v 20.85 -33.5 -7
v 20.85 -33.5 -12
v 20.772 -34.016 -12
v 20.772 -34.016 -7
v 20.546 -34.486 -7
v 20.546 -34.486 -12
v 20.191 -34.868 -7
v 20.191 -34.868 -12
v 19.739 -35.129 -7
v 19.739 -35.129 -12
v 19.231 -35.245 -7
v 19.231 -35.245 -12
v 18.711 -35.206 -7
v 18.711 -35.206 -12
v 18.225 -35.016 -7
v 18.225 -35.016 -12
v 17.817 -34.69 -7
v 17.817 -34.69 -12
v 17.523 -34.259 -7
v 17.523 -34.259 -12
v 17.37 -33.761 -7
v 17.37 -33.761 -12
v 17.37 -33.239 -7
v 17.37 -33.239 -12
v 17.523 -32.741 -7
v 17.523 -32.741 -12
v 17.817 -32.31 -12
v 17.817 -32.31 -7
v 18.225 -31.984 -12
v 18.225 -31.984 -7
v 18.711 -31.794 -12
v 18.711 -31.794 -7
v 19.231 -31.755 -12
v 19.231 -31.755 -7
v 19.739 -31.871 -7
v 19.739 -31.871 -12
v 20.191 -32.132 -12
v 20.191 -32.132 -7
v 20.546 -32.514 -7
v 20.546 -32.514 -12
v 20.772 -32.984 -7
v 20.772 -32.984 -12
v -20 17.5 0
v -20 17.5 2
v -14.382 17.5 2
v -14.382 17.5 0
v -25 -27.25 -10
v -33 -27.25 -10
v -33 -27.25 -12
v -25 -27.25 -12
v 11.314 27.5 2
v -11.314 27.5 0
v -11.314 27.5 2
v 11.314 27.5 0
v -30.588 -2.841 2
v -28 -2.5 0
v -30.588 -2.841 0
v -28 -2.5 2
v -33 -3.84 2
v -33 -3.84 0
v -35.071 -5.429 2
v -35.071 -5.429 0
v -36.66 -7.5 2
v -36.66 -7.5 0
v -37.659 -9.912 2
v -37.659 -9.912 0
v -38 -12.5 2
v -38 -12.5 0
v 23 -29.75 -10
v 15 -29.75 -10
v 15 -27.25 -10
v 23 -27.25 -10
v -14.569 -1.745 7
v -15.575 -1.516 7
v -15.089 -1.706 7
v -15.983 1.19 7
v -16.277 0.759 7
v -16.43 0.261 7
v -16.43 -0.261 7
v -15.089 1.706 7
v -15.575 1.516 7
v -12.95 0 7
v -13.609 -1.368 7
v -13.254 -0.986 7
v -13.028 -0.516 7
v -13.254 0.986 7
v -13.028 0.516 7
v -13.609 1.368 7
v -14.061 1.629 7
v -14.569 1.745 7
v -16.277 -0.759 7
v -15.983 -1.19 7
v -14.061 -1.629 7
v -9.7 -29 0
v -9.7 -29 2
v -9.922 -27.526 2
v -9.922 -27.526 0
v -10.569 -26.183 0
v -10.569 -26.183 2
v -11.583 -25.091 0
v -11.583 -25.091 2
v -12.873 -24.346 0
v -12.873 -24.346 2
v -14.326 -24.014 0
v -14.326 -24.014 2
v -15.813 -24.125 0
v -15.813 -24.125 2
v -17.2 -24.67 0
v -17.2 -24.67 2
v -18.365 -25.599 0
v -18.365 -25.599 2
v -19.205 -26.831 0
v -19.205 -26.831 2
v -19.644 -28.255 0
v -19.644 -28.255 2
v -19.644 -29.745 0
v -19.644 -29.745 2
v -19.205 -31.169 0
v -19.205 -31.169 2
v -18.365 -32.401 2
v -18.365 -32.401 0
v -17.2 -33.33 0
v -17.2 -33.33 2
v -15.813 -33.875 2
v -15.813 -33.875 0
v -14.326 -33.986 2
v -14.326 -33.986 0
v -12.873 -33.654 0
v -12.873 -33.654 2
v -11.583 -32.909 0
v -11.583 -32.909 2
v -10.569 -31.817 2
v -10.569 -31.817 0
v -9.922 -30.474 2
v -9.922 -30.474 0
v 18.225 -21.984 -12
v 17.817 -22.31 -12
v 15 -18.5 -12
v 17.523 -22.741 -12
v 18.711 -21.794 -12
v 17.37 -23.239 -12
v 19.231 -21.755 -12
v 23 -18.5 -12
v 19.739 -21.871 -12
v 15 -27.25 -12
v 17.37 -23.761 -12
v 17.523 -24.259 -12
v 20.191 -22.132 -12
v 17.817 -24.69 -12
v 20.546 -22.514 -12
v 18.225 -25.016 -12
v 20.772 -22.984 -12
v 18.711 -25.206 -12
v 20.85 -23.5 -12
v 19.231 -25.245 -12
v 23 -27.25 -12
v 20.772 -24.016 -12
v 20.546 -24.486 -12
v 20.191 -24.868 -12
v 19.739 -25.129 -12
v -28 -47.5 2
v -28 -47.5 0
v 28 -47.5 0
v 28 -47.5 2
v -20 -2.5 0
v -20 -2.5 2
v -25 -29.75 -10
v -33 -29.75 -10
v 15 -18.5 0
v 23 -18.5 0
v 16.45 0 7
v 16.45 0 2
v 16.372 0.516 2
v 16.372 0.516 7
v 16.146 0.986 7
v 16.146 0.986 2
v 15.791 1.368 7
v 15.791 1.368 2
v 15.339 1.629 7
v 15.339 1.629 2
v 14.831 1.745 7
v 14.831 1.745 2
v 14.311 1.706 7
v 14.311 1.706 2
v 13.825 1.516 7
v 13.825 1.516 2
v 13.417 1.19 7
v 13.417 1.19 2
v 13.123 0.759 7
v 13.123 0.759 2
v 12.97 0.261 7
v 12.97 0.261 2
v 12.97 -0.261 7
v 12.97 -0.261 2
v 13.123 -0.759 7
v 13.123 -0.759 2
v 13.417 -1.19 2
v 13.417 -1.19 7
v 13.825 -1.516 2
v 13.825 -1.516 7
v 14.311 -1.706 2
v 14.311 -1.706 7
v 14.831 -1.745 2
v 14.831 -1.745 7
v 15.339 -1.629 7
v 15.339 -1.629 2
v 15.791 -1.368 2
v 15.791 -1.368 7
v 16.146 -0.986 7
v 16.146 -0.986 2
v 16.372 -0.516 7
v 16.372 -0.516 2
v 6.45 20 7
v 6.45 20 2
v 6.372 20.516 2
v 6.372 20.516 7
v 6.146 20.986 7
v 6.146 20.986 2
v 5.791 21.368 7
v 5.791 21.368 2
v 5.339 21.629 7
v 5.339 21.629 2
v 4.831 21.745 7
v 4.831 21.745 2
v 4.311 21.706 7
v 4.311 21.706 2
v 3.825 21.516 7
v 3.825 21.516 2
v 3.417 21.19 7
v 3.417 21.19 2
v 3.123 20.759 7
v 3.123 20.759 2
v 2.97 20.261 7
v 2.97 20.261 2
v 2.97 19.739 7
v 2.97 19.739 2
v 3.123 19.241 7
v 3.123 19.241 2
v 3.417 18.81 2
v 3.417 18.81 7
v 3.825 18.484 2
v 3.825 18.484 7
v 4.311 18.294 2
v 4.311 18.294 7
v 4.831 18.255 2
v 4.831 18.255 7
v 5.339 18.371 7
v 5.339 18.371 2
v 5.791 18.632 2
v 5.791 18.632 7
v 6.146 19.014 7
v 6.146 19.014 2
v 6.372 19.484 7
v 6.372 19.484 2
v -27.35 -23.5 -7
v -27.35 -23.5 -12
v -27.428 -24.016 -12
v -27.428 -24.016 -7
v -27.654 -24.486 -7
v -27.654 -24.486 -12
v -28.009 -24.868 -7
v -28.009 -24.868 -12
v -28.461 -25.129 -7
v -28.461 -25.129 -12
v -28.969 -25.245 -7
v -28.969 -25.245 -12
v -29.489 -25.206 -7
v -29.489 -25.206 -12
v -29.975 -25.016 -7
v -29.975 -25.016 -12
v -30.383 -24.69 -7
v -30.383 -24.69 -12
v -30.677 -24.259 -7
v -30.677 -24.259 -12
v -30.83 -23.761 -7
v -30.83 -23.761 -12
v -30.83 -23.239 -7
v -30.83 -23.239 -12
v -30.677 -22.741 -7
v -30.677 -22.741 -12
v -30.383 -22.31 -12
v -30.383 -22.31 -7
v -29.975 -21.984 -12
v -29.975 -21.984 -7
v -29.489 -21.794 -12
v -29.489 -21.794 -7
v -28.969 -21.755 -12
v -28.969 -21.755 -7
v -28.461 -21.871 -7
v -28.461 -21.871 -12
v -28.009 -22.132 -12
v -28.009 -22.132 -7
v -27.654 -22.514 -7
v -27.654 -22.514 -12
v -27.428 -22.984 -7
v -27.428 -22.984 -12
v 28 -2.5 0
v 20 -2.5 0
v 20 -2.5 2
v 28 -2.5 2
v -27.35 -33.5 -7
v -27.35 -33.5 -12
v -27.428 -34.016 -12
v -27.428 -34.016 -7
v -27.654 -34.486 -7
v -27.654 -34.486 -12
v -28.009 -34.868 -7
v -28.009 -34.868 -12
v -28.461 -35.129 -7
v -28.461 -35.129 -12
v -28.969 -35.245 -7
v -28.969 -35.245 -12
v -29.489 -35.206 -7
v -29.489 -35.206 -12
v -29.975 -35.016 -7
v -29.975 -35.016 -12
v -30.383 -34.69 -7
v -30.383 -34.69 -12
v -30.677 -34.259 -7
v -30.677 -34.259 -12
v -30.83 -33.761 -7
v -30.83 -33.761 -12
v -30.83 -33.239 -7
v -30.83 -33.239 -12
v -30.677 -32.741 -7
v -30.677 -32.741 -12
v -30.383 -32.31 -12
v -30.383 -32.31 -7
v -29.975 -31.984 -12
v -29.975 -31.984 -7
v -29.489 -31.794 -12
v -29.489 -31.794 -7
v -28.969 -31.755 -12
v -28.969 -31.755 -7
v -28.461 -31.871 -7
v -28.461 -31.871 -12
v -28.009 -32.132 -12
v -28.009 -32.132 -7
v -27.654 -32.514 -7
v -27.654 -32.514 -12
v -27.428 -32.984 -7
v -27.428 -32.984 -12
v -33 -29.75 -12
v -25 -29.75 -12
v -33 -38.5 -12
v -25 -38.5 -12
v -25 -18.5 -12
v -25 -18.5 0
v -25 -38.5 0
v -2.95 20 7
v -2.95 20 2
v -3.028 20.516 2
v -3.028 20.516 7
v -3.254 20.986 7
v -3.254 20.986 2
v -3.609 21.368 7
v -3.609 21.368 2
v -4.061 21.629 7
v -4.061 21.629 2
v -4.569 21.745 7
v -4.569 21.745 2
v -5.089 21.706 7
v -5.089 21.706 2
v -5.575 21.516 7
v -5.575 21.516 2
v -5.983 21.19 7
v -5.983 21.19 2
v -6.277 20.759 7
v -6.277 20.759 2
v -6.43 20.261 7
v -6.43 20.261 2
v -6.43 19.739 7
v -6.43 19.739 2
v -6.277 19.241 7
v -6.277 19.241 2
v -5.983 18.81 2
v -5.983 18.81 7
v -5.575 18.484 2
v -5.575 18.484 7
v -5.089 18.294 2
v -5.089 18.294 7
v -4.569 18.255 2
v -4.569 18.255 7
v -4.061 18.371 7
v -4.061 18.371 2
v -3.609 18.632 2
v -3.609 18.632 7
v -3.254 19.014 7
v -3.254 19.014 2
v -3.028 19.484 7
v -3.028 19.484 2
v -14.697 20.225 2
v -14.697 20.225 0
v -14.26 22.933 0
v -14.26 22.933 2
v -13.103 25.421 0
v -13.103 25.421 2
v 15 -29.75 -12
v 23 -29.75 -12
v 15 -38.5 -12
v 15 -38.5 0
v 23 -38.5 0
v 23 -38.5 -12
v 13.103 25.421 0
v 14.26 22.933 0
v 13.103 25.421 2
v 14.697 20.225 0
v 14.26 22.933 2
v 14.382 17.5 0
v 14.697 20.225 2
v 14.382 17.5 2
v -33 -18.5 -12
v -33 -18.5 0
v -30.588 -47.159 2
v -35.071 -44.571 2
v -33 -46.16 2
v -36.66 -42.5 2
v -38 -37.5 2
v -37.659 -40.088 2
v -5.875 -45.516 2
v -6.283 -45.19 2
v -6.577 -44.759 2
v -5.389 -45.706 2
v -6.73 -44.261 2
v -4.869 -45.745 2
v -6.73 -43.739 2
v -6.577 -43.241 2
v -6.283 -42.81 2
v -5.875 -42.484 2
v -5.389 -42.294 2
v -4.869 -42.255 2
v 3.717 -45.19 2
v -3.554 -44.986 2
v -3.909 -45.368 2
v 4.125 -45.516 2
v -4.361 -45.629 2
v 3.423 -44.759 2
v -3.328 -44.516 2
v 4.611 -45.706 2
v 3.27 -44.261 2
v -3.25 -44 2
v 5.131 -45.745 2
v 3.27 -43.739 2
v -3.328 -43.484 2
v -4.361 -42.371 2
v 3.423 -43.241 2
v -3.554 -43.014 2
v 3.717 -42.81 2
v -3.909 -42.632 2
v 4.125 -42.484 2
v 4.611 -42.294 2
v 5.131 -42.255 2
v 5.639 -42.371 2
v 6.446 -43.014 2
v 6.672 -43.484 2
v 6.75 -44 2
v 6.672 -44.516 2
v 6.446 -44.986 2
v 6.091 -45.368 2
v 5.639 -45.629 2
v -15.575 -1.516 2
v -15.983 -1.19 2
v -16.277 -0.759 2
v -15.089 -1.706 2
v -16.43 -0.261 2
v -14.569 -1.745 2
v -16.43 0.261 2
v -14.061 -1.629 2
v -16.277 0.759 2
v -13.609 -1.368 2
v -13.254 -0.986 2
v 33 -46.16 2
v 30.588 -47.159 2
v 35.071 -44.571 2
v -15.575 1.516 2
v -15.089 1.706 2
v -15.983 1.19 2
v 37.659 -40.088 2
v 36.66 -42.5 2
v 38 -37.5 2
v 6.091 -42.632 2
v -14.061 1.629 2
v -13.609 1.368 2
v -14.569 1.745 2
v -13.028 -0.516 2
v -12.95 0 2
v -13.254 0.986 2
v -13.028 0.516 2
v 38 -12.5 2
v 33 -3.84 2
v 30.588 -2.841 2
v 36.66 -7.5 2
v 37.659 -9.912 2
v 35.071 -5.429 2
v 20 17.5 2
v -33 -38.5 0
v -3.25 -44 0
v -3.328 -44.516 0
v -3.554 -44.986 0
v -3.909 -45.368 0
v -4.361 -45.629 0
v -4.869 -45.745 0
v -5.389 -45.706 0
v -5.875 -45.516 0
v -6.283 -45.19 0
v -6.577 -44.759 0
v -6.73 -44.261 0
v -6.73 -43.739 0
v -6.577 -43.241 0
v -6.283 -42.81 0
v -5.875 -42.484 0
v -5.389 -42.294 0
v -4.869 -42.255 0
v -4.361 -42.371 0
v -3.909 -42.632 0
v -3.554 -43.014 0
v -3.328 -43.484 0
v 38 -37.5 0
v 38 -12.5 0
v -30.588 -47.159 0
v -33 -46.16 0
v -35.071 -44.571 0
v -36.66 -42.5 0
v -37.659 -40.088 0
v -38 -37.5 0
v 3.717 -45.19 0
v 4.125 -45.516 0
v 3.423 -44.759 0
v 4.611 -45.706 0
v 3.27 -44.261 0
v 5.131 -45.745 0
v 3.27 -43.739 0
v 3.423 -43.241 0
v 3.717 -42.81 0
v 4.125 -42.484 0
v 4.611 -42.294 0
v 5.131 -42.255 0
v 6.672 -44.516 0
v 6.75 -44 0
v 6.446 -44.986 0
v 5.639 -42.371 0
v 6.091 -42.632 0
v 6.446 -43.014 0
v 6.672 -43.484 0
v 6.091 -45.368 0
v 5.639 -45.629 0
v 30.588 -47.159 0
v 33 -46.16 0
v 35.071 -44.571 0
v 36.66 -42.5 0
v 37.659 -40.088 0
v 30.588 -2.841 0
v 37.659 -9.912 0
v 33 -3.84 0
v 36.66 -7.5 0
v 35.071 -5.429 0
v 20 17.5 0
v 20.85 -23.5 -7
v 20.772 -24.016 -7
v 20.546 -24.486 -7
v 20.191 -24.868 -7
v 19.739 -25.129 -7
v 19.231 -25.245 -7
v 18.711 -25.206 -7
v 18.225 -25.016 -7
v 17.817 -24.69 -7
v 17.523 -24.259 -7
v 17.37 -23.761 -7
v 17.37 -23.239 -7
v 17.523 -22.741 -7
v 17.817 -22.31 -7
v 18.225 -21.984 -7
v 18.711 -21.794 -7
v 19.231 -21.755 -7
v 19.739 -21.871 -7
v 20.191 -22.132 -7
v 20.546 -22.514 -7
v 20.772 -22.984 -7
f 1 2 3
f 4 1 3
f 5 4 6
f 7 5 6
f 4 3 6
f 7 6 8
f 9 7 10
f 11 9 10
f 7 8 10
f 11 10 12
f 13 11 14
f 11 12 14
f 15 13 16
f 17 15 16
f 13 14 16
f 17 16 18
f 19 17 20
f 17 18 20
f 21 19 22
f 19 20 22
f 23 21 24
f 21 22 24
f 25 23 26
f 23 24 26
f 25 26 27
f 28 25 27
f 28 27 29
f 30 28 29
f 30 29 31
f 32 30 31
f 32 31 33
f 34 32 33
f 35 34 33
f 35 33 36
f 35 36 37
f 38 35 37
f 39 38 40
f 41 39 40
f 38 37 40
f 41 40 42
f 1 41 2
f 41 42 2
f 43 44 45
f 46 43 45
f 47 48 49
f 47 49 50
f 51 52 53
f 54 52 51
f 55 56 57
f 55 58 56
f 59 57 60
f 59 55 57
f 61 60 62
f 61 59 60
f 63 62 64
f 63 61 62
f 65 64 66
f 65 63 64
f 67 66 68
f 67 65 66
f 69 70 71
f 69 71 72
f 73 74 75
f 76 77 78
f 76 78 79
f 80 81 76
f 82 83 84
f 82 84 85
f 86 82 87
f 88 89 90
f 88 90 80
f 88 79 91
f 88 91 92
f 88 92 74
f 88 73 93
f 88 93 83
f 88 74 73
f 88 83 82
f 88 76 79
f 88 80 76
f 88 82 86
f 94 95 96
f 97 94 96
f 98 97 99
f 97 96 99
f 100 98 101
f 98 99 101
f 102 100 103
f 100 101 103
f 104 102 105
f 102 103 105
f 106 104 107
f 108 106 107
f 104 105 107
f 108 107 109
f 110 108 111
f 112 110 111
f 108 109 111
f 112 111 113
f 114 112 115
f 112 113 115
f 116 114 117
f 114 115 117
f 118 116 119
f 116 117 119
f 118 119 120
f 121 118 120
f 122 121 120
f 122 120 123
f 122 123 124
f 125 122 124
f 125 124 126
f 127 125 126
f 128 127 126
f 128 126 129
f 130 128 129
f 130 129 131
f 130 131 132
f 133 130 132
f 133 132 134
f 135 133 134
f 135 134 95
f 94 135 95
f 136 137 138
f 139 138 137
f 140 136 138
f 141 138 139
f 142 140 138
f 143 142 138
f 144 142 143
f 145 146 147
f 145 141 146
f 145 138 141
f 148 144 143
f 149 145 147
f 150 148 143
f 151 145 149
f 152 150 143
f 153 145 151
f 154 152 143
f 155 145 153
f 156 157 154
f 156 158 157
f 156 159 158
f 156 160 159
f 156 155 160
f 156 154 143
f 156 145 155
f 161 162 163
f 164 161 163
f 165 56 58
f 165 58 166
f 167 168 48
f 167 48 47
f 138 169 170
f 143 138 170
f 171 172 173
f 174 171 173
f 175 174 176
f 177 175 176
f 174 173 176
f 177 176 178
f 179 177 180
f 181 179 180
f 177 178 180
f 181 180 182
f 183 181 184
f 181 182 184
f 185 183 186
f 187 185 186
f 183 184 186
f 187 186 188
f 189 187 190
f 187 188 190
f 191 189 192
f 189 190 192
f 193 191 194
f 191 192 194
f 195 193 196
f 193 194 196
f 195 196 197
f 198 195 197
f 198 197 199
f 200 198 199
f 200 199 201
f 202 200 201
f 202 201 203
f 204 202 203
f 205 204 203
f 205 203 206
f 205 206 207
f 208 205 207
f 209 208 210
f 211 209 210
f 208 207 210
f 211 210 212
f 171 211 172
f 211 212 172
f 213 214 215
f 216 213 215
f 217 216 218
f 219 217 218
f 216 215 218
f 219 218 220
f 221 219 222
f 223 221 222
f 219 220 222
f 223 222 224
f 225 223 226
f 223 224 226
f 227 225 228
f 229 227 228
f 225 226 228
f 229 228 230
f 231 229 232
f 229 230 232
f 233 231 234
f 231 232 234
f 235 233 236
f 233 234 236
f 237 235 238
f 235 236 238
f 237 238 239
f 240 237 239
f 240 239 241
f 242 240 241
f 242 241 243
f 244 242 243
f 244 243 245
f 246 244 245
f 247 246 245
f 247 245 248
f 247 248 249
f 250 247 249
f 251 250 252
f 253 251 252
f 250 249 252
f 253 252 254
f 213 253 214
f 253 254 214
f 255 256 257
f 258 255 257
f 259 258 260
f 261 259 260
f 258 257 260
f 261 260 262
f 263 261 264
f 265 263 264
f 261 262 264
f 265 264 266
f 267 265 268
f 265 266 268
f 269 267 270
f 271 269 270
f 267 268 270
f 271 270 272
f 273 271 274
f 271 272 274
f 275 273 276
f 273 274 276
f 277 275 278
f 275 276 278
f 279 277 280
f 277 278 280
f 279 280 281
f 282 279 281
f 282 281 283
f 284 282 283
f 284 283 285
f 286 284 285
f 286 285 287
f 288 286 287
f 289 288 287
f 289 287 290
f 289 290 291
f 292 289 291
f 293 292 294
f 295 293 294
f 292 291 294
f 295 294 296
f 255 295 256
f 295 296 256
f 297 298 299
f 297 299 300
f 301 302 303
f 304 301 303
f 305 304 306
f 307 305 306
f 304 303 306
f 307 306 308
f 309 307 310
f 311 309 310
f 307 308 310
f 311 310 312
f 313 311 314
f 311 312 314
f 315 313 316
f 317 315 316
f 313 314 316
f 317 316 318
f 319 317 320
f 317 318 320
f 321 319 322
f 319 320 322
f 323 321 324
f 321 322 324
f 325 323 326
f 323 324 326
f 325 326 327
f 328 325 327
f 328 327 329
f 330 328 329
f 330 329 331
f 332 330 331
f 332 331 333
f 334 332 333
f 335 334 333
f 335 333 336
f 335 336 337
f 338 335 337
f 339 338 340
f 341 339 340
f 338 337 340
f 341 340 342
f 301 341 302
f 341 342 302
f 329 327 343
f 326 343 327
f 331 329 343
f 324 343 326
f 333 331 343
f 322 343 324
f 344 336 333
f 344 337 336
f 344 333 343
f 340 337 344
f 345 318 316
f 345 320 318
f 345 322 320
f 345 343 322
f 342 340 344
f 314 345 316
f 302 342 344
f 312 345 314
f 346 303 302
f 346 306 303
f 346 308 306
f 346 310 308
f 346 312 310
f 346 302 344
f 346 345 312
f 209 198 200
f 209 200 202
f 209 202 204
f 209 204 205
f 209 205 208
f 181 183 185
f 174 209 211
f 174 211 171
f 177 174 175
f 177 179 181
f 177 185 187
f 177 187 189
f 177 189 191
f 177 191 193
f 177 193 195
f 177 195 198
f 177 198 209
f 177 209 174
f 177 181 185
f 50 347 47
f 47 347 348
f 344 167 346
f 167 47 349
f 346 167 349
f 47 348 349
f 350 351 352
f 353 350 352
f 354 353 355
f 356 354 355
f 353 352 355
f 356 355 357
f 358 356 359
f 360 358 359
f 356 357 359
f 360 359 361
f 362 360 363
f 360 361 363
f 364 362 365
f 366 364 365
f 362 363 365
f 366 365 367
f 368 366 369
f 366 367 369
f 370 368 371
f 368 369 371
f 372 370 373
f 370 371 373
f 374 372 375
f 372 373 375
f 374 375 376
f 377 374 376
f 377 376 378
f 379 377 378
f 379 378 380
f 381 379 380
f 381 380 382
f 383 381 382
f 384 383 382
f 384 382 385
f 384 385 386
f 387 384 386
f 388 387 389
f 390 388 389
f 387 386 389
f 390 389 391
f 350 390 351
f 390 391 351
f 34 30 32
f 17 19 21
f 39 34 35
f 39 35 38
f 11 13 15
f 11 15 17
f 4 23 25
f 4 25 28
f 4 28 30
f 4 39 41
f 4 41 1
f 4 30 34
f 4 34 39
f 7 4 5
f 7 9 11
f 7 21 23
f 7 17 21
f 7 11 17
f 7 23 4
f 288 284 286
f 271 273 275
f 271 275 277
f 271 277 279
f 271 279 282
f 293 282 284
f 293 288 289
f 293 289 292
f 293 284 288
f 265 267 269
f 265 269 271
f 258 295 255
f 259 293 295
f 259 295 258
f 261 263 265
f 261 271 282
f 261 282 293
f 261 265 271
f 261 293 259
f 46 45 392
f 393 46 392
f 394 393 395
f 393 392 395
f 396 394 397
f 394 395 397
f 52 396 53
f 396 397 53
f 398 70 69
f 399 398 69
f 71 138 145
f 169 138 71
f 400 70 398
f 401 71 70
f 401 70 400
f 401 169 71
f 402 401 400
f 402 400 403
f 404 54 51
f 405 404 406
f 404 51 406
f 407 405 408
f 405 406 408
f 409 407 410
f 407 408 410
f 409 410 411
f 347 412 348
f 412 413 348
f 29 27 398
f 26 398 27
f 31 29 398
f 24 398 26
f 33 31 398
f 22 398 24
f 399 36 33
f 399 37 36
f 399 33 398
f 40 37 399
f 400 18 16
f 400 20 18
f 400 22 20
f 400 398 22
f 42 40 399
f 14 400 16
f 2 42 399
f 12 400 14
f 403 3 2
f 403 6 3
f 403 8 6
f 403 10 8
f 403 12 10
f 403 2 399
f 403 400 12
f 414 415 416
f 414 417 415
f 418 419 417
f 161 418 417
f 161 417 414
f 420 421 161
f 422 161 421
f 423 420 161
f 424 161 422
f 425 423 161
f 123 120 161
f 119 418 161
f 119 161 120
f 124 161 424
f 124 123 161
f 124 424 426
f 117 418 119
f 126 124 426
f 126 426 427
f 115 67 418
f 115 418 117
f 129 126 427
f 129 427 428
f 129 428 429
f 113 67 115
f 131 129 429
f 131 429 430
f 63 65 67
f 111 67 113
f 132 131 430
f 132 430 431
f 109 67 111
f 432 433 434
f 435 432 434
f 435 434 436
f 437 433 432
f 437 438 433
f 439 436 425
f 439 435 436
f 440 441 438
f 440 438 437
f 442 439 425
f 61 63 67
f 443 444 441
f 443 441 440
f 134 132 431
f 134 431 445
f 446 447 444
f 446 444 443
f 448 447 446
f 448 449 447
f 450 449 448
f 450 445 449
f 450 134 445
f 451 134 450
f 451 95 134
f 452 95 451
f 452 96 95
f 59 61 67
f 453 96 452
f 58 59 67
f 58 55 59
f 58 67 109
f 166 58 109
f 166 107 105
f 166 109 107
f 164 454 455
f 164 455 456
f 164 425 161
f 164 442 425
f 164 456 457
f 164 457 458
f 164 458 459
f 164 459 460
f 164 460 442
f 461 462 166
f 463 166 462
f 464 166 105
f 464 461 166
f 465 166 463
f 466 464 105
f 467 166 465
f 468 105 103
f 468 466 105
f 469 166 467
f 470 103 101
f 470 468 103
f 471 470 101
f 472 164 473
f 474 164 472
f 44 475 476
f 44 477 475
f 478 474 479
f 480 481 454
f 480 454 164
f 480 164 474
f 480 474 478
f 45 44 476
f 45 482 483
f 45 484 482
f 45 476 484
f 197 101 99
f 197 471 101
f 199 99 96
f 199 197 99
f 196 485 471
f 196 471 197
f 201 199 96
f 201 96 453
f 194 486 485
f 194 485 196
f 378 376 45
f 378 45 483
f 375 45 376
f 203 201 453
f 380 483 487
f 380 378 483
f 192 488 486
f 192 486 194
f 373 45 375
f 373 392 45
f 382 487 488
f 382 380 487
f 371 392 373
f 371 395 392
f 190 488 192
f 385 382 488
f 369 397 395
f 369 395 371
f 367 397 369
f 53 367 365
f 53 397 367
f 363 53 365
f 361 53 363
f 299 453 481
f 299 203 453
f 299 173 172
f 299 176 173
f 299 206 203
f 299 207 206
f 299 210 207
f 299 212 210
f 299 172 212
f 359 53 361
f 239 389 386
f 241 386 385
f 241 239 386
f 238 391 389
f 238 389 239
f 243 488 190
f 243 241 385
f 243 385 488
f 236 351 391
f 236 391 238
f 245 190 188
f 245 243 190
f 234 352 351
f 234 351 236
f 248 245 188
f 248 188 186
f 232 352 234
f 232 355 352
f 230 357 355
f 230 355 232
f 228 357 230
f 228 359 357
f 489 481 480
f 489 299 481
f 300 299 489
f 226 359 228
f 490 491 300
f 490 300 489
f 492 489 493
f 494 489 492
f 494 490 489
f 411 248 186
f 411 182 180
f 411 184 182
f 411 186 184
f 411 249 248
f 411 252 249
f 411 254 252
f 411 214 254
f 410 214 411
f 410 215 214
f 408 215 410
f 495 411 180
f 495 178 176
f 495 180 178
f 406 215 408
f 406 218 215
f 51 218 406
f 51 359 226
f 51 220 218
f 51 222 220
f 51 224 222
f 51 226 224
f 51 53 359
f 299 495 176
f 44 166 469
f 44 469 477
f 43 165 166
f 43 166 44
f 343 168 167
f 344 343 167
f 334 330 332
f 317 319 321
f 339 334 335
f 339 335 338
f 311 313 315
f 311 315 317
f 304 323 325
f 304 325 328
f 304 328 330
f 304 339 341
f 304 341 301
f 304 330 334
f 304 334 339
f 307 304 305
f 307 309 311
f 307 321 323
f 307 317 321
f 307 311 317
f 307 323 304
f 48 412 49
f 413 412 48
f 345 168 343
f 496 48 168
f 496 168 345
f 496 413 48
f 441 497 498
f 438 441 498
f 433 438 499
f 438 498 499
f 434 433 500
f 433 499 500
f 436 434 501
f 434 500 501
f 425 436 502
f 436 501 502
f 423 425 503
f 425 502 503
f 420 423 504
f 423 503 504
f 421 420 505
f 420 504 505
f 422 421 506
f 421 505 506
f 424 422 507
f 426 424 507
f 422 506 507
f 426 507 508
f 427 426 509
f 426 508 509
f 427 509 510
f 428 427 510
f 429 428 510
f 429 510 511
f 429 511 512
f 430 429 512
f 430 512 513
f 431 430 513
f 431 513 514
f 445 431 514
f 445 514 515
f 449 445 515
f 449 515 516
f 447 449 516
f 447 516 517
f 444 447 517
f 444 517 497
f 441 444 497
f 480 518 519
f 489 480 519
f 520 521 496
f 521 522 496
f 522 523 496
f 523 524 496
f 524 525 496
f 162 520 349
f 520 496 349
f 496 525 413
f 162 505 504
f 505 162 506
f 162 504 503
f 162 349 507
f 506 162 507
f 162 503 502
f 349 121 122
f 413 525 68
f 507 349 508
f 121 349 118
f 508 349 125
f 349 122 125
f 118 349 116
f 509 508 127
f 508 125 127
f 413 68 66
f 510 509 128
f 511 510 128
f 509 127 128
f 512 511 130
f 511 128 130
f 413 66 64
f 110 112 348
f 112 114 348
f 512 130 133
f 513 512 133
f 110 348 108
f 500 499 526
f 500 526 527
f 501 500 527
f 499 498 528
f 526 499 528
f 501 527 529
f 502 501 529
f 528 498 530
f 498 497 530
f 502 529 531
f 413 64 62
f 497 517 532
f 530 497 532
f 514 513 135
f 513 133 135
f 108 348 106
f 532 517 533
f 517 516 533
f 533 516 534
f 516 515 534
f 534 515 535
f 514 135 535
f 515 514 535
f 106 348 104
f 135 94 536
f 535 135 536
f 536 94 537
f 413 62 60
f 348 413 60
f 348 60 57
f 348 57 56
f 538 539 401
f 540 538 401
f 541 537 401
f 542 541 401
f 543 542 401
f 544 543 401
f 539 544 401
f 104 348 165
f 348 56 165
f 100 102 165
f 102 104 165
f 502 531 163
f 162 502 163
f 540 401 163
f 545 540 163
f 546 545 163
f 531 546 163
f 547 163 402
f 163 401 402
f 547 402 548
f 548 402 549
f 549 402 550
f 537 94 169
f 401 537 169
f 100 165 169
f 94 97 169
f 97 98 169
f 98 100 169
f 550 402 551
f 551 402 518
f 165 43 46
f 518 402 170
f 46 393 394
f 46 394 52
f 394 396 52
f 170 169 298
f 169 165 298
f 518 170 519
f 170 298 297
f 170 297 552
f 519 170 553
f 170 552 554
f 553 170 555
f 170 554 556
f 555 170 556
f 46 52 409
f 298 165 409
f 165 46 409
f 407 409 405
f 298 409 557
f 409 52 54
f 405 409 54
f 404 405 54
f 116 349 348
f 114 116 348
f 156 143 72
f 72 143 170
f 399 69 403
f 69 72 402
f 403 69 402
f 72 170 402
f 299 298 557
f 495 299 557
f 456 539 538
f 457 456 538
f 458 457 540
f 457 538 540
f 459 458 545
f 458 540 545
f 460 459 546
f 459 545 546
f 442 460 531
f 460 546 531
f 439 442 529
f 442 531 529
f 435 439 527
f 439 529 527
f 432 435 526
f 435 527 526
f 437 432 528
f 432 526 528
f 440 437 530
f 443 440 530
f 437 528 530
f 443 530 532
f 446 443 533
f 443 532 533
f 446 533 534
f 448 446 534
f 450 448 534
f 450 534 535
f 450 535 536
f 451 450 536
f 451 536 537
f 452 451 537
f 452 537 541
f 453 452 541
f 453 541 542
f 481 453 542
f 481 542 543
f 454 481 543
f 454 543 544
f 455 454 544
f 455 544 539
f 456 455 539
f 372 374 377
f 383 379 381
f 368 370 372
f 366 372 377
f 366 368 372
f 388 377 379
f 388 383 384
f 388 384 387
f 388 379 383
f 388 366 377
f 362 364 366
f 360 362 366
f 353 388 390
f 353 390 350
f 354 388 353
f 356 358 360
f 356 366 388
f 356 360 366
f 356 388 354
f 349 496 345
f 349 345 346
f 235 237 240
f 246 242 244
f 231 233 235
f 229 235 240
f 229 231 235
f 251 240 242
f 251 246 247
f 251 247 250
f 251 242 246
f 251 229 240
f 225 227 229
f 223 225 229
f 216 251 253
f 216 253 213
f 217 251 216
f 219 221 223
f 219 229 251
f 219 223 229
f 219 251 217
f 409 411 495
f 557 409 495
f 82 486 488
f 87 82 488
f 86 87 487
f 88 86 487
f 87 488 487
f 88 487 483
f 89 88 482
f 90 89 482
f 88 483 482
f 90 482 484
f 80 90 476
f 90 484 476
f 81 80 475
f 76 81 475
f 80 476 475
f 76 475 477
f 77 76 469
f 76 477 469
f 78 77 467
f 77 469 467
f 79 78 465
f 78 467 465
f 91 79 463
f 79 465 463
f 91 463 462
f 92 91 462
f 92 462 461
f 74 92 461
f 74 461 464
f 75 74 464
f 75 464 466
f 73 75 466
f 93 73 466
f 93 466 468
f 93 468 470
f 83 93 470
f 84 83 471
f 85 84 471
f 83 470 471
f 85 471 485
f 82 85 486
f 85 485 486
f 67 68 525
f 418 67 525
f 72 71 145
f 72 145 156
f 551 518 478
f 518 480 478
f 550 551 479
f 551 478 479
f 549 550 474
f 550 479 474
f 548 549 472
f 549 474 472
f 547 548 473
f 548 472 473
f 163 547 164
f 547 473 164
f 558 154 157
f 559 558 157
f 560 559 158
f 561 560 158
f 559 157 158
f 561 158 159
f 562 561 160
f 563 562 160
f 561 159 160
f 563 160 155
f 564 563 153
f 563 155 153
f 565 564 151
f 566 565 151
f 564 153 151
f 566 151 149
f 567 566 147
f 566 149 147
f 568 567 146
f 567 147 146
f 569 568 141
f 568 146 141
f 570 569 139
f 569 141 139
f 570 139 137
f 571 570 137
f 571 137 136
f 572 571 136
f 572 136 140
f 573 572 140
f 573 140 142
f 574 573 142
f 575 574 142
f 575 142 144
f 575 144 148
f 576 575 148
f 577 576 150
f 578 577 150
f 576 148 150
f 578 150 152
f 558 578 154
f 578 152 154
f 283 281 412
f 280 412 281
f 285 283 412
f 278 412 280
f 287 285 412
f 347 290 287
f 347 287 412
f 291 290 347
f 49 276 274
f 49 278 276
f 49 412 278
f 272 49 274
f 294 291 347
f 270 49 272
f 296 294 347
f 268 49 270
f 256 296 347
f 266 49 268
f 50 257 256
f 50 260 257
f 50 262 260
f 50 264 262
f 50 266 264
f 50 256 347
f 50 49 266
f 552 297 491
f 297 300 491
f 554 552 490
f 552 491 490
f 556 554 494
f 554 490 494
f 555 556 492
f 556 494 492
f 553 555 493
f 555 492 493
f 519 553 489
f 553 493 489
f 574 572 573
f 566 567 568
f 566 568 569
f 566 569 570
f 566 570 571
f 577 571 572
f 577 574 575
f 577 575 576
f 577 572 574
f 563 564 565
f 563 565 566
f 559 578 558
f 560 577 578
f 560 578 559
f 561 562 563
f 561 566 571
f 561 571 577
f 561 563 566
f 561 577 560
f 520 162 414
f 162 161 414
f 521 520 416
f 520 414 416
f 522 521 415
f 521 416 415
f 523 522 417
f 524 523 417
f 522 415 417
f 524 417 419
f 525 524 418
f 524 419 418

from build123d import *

# Parameters (mm, degrees)
F0_W      = 40
F0_H      = 30
F1_DEPTH  = 2
F2_R      = 1.75
F3_DEPTH  = 5
F4_R      = 1.75
F5_DEPTH  = 5
F7_DEPTH  = 2.001
F8_W      = 100
F8_H      = 50
F9_DEPTH  = 2
F10_R     = 5
F11_DEPTH = 2.001
F12_W     = 8
F12_H     = 20
F13_DEPTH = 10
F14_W     = 8
F14_H     = 8.75
F15_DEPTH = 2
F16_R     = 1.75
F17_DEPTH = 5
F18_R     = 1.75
F19_DEPTH = 7.001
F20_R     = 10


with BuildPart() as f1:
    # F0 (on Top) → F1 (new body)
    with BuildSketch(Plane.XY):
        with Locations((0, 12.5)):
            Rectangle(F0_W, F0_H)
    extrude(amount=F1_DEPTH)

    # F2 (on face) → F3 (join)
    with BuildSketch(Plane.XY.offset(2)):
        with Locations((14.7, 0)):
            Circle(F2_R)
        with Locations((-14.7, 0)):
            Circle(F2_R)
    extrude(amount=F3_DEPTH)

    # F4 (on face) → F5 (join)
    with BuildSketch(Plane.XY.offset(2)):
        with Locations((-4.7, 20)):
            Circle(F4_R)
        with Locations((4.7, 20)):
            Circle(F4_R)
    extrude(amount=F5_DEPTH)

    # F6 (on face) → F7 (cut, through all)
    with BuildSketch(Plane.XY.offset(2)):
        with BuildLine():
            ThreePointArc((-14.3824583655, 17.5), (-14.2570409722, 22.9432920101), (-11.298423737, 27.5140404701))
            Line((-11.298423737, 27.5140404701), (-20, 27.5140404701))
            Line((-20, 27.5140404701), (-20, 17.5))
            Line((-20, 17.5), (-14.3824583655, 17.5))
        make_face()
        with BuildLine():
            Line((20, 27.5140404701), (11.298423737, 27.5140404701))
            ThreePointArc((11.298423737, 27.5140404701), (14.2570409722, 22.9432920101), (14.3824583655, 17.5))
            Line((14.3824583655, 17.5), (20, 17.5))
            Line((20, 17.5), (20, 27.5140404701))
        make_face()
    extrude(amount=-F7_DEPTH, mode=Mode.SUBTRACT)

    # F8 (on Top) → F9 (join)
    with BuildSketch(Plane.XY):
        with Locations((0, -27.5)):
            Rectangle(F8_W, F8_H)
    extrude(amount=F9_DEPTH)

    # F10 (on face) → F11 (cut, through all)
    with BuildSketch(Plane.XY.offset(2)):
        with Locations((-14.7, -29)):
            Circle(F10_R)
    extrude(amount=-F11_DEPTH, mode=Mode.SUBTRACT)

    # F12 (on face) → F13 (join)
    with BuildSketch(Plane(origin=(0, 0, 0), x_dir=(1, 0, 0), z_dir=(0, 0, -1))):
        with Locations((-29, 28.5)):
            Rectangle(F12_W, F12_H)
        with Locations((19, 28.5)):
            Rectangle(F12_W, F12_H)
    extrude(amount=F13_DEPTH)

    # F14 (on face) → F15 (join)
    with BuildSketch(Plane(origin=(0, 0, -10), x_dir=(1, 0, 0), z_dir=(0, 0, -1))):
        with Locations((-29, 22.875)):
            Rectangle(F14_W, F14_H)
        with Locations((-29, 34.125)):
            Rectangle(F14_W, F14_H)
        with Locations((19, 34.125)):
            Rectangle(F14_W, F14_H)
        with Locations((19, 22.875)):
            Rectangle(F14_W, F14_H)
    extrude(amount=F15_DEPTH)

    # F16 (on face) → F17 (cut)
    with BuildSketch(Plane(origin=(0, 0, -12), x_dir=(1, 0, 0), z_dir=(0, 0, -1))):
        with Locations((-29.1, 33.5)):
            Circle(F16_R)
        with Locations((-29.1, 23.5)):
            Circle(F16_R)
        with Locations((19.1, 23.5)):
            Circle(F16_R)
        with Locations((19.1, 33.5)):
            Circle(F16_R)
    extrude(amount=-F17_DEPTH, mode=Mode.SUBTRACT)

    # F18 (on face) → F19 (cut, through all)
    with BuildSketch(Plane(origin=(0, 0, 0), x_dir=(1, 0, 0), z_dir=(0, 0, -1))):
        Polygon((-38, 52.5), (-50, 52.5), (-50, 47.5), (-50, 2.5), (-38, 2.5), (-38, 47.5), (38, 47.5), (38, 2.5), (50, 2.5), (50, 47.5), (50, 52.5), (38, 52.5), align=None)
        with Locations((-5, 44)):
            Circle(F18_R)
        with Locations((5, 44)):
            Circle(F18_R)
    extrude(amount=-F19_DEPTH, mode=Mode.SUBTRACT)

    # F20
    f20_edges = [f1.edges().sort_by_distance(p)[0] for p in [
        (-38, -2.5, 1),
        (38, -2.5, 1),
        (-38, -47.5, 1),
        (38, -47.5, 1),
    ]]
    fillet(f20_edges, radius=F20_R)


solid = f1.part
